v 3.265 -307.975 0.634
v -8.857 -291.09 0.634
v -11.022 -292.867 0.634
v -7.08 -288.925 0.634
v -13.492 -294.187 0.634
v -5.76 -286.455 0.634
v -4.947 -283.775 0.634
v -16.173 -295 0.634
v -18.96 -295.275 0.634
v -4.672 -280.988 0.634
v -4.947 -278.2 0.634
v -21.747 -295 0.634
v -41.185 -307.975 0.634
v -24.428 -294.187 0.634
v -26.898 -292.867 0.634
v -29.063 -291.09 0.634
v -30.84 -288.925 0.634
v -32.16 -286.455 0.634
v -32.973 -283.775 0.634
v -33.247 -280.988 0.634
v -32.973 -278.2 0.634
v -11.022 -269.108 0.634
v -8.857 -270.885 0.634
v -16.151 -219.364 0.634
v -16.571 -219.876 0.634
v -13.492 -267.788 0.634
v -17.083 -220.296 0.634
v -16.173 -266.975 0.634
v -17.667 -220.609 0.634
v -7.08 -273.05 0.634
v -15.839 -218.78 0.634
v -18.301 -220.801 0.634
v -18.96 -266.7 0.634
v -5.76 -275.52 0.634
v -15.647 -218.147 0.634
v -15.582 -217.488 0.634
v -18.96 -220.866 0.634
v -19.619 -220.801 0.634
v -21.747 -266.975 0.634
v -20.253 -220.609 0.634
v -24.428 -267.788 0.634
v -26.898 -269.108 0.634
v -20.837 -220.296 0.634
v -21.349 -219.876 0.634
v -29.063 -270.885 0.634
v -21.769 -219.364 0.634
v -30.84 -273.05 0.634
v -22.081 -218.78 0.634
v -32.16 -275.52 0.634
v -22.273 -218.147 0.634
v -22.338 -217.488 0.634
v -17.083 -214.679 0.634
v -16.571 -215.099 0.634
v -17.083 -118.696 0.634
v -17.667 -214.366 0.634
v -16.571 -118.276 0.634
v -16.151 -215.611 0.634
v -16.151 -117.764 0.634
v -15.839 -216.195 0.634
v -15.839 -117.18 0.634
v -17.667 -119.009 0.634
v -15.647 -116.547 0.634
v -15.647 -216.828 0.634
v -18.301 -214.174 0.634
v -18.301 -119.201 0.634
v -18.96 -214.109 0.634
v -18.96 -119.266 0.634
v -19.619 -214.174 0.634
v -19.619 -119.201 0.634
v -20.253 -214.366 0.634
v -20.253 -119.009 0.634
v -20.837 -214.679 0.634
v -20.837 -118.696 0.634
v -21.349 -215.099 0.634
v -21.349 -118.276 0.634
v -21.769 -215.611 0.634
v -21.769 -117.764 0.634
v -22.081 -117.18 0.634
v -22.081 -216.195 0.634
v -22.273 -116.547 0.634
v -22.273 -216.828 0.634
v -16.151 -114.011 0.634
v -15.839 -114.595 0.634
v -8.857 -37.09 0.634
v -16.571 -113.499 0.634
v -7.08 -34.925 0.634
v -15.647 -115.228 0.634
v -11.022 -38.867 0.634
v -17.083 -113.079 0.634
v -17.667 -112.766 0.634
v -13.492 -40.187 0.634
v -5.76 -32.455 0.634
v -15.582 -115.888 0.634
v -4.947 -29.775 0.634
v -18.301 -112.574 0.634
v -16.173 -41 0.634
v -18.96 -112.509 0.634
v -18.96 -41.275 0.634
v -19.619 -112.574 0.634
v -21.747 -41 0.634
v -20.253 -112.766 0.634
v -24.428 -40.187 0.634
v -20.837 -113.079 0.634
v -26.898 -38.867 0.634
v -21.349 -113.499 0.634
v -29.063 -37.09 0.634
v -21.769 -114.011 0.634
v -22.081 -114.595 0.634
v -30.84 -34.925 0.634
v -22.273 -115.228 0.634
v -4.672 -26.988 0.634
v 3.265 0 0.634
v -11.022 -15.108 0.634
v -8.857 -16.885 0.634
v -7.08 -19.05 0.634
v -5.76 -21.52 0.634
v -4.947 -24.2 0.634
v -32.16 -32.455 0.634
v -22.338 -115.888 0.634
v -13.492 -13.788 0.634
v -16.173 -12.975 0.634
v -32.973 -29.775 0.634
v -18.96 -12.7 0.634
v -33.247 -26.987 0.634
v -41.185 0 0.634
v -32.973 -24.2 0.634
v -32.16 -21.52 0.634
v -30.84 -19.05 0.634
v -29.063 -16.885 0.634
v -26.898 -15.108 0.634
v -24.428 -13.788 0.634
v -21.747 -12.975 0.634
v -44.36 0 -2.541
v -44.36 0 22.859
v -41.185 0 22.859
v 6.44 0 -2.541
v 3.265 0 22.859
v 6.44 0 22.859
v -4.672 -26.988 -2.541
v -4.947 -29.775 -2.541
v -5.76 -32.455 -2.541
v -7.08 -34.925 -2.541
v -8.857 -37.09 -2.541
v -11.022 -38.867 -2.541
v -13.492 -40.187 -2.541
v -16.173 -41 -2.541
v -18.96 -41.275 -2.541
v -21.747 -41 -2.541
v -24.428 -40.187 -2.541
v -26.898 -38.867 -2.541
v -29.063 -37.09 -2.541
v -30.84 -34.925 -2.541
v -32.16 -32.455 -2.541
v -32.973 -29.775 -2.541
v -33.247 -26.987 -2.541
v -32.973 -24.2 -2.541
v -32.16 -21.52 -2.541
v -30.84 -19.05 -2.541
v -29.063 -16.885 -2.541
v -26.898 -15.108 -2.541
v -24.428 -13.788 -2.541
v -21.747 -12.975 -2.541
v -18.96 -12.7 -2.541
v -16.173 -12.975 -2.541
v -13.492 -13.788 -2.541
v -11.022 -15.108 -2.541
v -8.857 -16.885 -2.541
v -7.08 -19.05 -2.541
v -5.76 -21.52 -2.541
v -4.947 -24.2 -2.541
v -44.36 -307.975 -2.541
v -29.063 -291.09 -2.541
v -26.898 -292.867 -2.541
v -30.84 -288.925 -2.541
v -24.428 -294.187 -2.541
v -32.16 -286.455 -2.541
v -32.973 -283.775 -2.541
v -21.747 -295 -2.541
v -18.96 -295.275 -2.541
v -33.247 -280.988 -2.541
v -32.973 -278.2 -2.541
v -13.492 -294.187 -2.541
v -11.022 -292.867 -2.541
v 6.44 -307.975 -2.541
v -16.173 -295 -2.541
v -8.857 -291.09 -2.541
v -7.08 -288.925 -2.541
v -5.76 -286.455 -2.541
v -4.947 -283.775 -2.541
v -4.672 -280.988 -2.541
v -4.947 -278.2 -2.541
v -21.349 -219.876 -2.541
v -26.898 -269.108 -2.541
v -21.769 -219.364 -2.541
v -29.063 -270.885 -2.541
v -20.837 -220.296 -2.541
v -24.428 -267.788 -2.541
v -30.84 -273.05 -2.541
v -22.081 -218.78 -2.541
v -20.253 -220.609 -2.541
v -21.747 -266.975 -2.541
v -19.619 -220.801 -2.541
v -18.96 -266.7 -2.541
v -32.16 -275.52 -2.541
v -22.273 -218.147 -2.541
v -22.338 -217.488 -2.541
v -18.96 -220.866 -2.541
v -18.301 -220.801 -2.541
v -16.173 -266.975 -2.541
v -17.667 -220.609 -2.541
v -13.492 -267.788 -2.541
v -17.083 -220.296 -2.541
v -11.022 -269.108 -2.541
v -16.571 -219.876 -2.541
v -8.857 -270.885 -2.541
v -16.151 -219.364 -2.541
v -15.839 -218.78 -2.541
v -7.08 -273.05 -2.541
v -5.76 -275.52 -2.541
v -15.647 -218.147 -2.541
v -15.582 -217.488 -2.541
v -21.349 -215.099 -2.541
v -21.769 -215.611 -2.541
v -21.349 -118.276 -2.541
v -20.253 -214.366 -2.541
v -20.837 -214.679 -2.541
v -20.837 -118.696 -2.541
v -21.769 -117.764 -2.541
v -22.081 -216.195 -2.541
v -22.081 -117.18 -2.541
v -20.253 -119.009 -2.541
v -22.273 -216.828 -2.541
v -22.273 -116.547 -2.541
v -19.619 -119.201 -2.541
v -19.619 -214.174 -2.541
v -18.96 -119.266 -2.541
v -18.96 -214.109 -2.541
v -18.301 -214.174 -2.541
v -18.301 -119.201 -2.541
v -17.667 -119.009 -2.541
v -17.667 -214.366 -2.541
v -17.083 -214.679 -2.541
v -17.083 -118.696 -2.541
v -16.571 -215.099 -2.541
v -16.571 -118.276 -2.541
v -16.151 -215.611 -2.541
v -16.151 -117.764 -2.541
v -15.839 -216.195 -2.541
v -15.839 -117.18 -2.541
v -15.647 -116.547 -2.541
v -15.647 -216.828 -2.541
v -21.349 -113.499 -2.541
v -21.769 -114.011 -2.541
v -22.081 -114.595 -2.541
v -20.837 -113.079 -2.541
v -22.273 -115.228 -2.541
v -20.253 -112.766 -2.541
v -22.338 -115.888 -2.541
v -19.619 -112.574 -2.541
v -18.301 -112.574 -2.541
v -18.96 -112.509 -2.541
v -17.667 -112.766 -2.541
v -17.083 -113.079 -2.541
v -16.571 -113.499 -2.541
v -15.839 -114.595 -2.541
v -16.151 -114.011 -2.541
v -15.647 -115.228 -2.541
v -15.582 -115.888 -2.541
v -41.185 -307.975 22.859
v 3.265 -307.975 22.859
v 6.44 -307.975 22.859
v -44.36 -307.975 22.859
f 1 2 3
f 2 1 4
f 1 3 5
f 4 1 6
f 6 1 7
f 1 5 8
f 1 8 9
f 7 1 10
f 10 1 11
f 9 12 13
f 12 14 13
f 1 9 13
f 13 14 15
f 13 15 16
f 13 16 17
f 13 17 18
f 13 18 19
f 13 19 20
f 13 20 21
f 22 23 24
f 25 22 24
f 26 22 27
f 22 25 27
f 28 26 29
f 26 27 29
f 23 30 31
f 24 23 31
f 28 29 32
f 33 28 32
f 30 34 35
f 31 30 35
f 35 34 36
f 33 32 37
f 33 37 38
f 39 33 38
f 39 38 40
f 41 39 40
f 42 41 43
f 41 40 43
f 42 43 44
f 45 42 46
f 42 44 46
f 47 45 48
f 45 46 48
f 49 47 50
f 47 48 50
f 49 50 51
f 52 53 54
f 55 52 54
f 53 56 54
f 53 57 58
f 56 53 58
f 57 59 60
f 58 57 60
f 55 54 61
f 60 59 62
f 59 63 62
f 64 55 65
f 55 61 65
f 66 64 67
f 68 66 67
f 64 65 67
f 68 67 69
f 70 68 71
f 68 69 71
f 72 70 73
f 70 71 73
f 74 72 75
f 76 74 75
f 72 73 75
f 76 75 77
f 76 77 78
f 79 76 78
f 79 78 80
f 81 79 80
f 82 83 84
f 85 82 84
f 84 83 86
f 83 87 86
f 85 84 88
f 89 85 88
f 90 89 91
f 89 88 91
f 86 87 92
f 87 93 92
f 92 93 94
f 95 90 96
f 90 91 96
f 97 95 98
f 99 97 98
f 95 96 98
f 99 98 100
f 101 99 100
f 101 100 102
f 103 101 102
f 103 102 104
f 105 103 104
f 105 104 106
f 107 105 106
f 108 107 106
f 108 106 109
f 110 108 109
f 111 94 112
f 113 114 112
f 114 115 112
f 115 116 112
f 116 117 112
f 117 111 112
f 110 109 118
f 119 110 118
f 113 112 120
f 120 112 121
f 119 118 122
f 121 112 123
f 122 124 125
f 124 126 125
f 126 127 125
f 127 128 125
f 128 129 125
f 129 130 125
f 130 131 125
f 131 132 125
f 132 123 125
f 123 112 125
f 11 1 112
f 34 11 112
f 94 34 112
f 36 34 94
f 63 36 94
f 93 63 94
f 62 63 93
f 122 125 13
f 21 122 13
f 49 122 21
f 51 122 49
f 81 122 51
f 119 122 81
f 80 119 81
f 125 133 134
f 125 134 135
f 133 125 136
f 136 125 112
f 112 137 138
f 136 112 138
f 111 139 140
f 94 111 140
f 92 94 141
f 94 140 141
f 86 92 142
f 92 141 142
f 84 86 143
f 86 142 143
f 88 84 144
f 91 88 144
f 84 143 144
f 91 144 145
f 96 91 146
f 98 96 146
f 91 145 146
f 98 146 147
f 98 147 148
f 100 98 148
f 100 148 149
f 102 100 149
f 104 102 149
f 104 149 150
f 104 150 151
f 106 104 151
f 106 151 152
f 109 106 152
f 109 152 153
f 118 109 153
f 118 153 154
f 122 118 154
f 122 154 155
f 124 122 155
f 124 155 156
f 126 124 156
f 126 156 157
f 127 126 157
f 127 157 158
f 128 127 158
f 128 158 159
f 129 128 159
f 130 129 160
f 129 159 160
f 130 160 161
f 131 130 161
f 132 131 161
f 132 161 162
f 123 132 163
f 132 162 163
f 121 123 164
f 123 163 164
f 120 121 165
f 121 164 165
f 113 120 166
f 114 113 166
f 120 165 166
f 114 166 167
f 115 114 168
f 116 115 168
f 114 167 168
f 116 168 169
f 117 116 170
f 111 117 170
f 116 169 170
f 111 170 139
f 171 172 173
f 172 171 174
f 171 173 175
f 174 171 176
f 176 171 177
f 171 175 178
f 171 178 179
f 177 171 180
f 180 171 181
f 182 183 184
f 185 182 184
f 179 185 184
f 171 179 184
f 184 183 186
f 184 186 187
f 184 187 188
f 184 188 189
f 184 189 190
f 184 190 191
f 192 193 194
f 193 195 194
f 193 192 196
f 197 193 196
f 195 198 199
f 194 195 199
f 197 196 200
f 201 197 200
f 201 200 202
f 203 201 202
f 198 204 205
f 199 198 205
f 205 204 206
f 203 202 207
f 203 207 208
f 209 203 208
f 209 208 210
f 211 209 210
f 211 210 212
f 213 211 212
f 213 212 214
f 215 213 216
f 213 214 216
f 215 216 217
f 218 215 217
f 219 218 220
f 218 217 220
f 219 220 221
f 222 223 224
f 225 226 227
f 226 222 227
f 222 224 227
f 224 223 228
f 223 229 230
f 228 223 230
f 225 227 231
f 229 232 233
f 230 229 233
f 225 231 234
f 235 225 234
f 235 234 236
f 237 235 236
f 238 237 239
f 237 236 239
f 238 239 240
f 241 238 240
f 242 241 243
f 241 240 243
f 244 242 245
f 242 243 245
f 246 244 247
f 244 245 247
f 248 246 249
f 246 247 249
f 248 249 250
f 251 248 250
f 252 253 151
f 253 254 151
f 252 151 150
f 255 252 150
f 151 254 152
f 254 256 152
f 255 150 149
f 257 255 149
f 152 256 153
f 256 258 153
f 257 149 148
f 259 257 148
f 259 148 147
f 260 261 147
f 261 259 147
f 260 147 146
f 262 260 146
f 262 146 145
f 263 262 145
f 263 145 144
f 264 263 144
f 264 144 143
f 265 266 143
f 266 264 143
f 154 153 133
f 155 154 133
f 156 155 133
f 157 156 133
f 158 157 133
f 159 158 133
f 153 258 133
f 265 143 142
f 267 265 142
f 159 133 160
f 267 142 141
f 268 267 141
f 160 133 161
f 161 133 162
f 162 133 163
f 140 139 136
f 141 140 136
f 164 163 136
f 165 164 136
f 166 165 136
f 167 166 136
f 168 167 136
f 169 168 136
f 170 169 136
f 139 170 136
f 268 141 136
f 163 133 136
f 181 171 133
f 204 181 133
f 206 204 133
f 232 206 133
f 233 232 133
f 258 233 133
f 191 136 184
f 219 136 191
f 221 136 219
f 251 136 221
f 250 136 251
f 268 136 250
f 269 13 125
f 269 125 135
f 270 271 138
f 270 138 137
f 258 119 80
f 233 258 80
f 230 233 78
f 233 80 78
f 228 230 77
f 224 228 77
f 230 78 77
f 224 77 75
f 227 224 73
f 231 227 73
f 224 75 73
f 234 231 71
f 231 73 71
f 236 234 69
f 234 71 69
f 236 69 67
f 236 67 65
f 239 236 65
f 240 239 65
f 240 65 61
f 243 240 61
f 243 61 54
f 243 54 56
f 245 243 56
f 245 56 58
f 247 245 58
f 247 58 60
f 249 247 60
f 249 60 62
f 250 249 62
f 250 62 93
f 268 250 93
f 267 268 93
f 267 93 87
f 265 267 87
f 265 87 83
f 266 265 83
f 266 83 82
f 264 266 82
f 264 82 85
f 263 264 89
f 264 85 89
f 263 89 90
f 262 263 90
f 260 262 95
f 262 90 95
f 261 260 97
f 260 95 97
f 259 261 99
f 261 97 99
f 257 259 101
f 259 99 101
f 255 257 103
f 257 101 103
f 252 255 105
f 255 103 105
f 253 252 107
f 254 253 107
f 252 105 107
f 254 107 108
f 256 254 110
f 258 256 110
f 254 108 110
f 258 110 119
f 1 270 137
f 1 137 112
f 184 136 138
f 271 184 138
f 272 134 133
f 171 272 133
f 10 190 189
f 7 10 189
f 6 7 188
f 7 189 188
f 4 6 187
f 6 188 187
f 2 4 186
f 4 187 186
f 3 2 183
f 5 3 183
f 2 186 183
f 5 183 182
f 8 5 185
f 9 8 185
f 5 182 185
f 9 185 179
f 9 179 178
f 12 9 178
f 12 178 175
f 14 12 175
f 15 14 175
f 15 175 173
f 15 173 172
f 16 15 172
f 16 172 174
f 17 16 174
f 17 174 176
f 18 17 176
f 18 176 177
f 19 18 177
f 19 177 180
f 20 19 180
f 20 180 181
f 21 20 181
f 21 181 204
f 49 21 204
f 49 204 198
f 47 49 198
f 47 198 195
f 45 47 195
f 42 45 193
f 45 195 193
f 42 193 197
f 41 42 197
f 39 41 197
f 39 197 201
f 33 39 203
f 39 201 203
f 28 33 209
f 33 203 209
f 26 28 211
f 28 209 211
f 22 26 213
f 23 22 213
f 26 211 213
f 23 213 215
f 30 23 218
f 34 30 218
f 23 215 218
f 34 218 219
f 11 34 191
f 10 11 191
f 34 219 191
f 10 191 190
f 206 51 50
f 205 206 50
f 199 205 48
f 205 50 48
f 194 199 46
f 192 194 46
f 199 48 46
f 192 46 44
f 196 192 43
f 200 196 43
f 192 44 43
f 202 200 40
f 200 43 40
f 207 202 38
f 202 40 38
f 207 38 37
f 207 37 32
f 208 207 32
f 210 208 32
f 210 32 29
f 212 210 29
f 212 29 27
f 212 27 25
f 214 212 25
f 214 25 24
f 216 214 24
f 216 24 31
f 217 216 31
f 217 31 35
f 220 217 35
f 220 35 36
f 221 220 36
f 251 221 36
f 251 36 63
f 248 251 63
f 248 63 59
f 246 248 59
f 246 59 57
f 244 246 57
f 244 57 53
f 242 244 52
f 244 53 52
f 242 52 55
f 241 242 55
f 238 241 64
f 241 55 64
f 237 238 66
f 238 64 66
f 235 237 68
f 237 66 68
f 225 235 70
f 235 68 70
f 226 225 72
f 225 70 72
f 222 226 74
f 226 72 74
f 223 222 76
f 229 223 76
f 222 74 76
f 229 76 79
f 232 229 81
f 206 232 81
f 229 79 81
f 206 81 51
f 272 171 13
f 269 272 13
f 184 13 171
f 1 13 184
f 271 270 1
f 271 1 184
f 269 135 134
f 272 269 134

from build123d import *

# Parameters (mm, degrees)
F1_DEPTH = 307.975
F2_R     = 14.2875
F3_DEPTH = 25.4
F4_D     = 6.7564
F4_DEPTH = 76.2
F4_TIP   = 2.0298273432


with BuildPart() as f1:
    # F0 (on Front) → F1 (new body)
    with BuildSketch(Plane.XZ):
        Polygon((-41.1849285887, 22.8587505986), (-44.3599285887, 22.8587505986), (-44.3599285887, -2.5412494014), (6.4400714113, -2.5412494014), (6.4400714113, 22.8587505986), (3.2650714113, 22.8587505986), (3.2650714113, 0.6337505986), (-41.1849285887, 0.6337505986), align=None)
    extrude(amount=F1_DEPTH)

    # F2 (on face) → F3 (cut)
    with BuildSketch(Plane(origin=(0, 0, -2.5412494014), x_dir=(1, 0, 0), z_dir=(0, 0, -1))):
        with Locations((-18.9599285887, 280.9875)):
            Circle(F2_R)
        with Locations((-18.9599285887, 26.9875)):
            Circle(F2_R)
    extrude(amount=-F3_DEPTH, mode=Mode.SUBTRACT)

    # F4
    with Locations(Plane(origin=(0, 0, -2.5412494014), x_dir=(1, 0, 0), z_dir=(0, 0, -1))):
        with Locations((-18.9599285887, 217.4875), (-18.9599285887, 115.8875)):
            Hole(F4_D / 2, depth=F4_DEPTH)
            with Locations((0, 0, -(F4_DEPTH + F4_TIP / 2))):  # 118° drill point
                Cone(0, F4_D / 2, F4_TIP, mode=Mode.SUBTRACT)


solid = f1.part
